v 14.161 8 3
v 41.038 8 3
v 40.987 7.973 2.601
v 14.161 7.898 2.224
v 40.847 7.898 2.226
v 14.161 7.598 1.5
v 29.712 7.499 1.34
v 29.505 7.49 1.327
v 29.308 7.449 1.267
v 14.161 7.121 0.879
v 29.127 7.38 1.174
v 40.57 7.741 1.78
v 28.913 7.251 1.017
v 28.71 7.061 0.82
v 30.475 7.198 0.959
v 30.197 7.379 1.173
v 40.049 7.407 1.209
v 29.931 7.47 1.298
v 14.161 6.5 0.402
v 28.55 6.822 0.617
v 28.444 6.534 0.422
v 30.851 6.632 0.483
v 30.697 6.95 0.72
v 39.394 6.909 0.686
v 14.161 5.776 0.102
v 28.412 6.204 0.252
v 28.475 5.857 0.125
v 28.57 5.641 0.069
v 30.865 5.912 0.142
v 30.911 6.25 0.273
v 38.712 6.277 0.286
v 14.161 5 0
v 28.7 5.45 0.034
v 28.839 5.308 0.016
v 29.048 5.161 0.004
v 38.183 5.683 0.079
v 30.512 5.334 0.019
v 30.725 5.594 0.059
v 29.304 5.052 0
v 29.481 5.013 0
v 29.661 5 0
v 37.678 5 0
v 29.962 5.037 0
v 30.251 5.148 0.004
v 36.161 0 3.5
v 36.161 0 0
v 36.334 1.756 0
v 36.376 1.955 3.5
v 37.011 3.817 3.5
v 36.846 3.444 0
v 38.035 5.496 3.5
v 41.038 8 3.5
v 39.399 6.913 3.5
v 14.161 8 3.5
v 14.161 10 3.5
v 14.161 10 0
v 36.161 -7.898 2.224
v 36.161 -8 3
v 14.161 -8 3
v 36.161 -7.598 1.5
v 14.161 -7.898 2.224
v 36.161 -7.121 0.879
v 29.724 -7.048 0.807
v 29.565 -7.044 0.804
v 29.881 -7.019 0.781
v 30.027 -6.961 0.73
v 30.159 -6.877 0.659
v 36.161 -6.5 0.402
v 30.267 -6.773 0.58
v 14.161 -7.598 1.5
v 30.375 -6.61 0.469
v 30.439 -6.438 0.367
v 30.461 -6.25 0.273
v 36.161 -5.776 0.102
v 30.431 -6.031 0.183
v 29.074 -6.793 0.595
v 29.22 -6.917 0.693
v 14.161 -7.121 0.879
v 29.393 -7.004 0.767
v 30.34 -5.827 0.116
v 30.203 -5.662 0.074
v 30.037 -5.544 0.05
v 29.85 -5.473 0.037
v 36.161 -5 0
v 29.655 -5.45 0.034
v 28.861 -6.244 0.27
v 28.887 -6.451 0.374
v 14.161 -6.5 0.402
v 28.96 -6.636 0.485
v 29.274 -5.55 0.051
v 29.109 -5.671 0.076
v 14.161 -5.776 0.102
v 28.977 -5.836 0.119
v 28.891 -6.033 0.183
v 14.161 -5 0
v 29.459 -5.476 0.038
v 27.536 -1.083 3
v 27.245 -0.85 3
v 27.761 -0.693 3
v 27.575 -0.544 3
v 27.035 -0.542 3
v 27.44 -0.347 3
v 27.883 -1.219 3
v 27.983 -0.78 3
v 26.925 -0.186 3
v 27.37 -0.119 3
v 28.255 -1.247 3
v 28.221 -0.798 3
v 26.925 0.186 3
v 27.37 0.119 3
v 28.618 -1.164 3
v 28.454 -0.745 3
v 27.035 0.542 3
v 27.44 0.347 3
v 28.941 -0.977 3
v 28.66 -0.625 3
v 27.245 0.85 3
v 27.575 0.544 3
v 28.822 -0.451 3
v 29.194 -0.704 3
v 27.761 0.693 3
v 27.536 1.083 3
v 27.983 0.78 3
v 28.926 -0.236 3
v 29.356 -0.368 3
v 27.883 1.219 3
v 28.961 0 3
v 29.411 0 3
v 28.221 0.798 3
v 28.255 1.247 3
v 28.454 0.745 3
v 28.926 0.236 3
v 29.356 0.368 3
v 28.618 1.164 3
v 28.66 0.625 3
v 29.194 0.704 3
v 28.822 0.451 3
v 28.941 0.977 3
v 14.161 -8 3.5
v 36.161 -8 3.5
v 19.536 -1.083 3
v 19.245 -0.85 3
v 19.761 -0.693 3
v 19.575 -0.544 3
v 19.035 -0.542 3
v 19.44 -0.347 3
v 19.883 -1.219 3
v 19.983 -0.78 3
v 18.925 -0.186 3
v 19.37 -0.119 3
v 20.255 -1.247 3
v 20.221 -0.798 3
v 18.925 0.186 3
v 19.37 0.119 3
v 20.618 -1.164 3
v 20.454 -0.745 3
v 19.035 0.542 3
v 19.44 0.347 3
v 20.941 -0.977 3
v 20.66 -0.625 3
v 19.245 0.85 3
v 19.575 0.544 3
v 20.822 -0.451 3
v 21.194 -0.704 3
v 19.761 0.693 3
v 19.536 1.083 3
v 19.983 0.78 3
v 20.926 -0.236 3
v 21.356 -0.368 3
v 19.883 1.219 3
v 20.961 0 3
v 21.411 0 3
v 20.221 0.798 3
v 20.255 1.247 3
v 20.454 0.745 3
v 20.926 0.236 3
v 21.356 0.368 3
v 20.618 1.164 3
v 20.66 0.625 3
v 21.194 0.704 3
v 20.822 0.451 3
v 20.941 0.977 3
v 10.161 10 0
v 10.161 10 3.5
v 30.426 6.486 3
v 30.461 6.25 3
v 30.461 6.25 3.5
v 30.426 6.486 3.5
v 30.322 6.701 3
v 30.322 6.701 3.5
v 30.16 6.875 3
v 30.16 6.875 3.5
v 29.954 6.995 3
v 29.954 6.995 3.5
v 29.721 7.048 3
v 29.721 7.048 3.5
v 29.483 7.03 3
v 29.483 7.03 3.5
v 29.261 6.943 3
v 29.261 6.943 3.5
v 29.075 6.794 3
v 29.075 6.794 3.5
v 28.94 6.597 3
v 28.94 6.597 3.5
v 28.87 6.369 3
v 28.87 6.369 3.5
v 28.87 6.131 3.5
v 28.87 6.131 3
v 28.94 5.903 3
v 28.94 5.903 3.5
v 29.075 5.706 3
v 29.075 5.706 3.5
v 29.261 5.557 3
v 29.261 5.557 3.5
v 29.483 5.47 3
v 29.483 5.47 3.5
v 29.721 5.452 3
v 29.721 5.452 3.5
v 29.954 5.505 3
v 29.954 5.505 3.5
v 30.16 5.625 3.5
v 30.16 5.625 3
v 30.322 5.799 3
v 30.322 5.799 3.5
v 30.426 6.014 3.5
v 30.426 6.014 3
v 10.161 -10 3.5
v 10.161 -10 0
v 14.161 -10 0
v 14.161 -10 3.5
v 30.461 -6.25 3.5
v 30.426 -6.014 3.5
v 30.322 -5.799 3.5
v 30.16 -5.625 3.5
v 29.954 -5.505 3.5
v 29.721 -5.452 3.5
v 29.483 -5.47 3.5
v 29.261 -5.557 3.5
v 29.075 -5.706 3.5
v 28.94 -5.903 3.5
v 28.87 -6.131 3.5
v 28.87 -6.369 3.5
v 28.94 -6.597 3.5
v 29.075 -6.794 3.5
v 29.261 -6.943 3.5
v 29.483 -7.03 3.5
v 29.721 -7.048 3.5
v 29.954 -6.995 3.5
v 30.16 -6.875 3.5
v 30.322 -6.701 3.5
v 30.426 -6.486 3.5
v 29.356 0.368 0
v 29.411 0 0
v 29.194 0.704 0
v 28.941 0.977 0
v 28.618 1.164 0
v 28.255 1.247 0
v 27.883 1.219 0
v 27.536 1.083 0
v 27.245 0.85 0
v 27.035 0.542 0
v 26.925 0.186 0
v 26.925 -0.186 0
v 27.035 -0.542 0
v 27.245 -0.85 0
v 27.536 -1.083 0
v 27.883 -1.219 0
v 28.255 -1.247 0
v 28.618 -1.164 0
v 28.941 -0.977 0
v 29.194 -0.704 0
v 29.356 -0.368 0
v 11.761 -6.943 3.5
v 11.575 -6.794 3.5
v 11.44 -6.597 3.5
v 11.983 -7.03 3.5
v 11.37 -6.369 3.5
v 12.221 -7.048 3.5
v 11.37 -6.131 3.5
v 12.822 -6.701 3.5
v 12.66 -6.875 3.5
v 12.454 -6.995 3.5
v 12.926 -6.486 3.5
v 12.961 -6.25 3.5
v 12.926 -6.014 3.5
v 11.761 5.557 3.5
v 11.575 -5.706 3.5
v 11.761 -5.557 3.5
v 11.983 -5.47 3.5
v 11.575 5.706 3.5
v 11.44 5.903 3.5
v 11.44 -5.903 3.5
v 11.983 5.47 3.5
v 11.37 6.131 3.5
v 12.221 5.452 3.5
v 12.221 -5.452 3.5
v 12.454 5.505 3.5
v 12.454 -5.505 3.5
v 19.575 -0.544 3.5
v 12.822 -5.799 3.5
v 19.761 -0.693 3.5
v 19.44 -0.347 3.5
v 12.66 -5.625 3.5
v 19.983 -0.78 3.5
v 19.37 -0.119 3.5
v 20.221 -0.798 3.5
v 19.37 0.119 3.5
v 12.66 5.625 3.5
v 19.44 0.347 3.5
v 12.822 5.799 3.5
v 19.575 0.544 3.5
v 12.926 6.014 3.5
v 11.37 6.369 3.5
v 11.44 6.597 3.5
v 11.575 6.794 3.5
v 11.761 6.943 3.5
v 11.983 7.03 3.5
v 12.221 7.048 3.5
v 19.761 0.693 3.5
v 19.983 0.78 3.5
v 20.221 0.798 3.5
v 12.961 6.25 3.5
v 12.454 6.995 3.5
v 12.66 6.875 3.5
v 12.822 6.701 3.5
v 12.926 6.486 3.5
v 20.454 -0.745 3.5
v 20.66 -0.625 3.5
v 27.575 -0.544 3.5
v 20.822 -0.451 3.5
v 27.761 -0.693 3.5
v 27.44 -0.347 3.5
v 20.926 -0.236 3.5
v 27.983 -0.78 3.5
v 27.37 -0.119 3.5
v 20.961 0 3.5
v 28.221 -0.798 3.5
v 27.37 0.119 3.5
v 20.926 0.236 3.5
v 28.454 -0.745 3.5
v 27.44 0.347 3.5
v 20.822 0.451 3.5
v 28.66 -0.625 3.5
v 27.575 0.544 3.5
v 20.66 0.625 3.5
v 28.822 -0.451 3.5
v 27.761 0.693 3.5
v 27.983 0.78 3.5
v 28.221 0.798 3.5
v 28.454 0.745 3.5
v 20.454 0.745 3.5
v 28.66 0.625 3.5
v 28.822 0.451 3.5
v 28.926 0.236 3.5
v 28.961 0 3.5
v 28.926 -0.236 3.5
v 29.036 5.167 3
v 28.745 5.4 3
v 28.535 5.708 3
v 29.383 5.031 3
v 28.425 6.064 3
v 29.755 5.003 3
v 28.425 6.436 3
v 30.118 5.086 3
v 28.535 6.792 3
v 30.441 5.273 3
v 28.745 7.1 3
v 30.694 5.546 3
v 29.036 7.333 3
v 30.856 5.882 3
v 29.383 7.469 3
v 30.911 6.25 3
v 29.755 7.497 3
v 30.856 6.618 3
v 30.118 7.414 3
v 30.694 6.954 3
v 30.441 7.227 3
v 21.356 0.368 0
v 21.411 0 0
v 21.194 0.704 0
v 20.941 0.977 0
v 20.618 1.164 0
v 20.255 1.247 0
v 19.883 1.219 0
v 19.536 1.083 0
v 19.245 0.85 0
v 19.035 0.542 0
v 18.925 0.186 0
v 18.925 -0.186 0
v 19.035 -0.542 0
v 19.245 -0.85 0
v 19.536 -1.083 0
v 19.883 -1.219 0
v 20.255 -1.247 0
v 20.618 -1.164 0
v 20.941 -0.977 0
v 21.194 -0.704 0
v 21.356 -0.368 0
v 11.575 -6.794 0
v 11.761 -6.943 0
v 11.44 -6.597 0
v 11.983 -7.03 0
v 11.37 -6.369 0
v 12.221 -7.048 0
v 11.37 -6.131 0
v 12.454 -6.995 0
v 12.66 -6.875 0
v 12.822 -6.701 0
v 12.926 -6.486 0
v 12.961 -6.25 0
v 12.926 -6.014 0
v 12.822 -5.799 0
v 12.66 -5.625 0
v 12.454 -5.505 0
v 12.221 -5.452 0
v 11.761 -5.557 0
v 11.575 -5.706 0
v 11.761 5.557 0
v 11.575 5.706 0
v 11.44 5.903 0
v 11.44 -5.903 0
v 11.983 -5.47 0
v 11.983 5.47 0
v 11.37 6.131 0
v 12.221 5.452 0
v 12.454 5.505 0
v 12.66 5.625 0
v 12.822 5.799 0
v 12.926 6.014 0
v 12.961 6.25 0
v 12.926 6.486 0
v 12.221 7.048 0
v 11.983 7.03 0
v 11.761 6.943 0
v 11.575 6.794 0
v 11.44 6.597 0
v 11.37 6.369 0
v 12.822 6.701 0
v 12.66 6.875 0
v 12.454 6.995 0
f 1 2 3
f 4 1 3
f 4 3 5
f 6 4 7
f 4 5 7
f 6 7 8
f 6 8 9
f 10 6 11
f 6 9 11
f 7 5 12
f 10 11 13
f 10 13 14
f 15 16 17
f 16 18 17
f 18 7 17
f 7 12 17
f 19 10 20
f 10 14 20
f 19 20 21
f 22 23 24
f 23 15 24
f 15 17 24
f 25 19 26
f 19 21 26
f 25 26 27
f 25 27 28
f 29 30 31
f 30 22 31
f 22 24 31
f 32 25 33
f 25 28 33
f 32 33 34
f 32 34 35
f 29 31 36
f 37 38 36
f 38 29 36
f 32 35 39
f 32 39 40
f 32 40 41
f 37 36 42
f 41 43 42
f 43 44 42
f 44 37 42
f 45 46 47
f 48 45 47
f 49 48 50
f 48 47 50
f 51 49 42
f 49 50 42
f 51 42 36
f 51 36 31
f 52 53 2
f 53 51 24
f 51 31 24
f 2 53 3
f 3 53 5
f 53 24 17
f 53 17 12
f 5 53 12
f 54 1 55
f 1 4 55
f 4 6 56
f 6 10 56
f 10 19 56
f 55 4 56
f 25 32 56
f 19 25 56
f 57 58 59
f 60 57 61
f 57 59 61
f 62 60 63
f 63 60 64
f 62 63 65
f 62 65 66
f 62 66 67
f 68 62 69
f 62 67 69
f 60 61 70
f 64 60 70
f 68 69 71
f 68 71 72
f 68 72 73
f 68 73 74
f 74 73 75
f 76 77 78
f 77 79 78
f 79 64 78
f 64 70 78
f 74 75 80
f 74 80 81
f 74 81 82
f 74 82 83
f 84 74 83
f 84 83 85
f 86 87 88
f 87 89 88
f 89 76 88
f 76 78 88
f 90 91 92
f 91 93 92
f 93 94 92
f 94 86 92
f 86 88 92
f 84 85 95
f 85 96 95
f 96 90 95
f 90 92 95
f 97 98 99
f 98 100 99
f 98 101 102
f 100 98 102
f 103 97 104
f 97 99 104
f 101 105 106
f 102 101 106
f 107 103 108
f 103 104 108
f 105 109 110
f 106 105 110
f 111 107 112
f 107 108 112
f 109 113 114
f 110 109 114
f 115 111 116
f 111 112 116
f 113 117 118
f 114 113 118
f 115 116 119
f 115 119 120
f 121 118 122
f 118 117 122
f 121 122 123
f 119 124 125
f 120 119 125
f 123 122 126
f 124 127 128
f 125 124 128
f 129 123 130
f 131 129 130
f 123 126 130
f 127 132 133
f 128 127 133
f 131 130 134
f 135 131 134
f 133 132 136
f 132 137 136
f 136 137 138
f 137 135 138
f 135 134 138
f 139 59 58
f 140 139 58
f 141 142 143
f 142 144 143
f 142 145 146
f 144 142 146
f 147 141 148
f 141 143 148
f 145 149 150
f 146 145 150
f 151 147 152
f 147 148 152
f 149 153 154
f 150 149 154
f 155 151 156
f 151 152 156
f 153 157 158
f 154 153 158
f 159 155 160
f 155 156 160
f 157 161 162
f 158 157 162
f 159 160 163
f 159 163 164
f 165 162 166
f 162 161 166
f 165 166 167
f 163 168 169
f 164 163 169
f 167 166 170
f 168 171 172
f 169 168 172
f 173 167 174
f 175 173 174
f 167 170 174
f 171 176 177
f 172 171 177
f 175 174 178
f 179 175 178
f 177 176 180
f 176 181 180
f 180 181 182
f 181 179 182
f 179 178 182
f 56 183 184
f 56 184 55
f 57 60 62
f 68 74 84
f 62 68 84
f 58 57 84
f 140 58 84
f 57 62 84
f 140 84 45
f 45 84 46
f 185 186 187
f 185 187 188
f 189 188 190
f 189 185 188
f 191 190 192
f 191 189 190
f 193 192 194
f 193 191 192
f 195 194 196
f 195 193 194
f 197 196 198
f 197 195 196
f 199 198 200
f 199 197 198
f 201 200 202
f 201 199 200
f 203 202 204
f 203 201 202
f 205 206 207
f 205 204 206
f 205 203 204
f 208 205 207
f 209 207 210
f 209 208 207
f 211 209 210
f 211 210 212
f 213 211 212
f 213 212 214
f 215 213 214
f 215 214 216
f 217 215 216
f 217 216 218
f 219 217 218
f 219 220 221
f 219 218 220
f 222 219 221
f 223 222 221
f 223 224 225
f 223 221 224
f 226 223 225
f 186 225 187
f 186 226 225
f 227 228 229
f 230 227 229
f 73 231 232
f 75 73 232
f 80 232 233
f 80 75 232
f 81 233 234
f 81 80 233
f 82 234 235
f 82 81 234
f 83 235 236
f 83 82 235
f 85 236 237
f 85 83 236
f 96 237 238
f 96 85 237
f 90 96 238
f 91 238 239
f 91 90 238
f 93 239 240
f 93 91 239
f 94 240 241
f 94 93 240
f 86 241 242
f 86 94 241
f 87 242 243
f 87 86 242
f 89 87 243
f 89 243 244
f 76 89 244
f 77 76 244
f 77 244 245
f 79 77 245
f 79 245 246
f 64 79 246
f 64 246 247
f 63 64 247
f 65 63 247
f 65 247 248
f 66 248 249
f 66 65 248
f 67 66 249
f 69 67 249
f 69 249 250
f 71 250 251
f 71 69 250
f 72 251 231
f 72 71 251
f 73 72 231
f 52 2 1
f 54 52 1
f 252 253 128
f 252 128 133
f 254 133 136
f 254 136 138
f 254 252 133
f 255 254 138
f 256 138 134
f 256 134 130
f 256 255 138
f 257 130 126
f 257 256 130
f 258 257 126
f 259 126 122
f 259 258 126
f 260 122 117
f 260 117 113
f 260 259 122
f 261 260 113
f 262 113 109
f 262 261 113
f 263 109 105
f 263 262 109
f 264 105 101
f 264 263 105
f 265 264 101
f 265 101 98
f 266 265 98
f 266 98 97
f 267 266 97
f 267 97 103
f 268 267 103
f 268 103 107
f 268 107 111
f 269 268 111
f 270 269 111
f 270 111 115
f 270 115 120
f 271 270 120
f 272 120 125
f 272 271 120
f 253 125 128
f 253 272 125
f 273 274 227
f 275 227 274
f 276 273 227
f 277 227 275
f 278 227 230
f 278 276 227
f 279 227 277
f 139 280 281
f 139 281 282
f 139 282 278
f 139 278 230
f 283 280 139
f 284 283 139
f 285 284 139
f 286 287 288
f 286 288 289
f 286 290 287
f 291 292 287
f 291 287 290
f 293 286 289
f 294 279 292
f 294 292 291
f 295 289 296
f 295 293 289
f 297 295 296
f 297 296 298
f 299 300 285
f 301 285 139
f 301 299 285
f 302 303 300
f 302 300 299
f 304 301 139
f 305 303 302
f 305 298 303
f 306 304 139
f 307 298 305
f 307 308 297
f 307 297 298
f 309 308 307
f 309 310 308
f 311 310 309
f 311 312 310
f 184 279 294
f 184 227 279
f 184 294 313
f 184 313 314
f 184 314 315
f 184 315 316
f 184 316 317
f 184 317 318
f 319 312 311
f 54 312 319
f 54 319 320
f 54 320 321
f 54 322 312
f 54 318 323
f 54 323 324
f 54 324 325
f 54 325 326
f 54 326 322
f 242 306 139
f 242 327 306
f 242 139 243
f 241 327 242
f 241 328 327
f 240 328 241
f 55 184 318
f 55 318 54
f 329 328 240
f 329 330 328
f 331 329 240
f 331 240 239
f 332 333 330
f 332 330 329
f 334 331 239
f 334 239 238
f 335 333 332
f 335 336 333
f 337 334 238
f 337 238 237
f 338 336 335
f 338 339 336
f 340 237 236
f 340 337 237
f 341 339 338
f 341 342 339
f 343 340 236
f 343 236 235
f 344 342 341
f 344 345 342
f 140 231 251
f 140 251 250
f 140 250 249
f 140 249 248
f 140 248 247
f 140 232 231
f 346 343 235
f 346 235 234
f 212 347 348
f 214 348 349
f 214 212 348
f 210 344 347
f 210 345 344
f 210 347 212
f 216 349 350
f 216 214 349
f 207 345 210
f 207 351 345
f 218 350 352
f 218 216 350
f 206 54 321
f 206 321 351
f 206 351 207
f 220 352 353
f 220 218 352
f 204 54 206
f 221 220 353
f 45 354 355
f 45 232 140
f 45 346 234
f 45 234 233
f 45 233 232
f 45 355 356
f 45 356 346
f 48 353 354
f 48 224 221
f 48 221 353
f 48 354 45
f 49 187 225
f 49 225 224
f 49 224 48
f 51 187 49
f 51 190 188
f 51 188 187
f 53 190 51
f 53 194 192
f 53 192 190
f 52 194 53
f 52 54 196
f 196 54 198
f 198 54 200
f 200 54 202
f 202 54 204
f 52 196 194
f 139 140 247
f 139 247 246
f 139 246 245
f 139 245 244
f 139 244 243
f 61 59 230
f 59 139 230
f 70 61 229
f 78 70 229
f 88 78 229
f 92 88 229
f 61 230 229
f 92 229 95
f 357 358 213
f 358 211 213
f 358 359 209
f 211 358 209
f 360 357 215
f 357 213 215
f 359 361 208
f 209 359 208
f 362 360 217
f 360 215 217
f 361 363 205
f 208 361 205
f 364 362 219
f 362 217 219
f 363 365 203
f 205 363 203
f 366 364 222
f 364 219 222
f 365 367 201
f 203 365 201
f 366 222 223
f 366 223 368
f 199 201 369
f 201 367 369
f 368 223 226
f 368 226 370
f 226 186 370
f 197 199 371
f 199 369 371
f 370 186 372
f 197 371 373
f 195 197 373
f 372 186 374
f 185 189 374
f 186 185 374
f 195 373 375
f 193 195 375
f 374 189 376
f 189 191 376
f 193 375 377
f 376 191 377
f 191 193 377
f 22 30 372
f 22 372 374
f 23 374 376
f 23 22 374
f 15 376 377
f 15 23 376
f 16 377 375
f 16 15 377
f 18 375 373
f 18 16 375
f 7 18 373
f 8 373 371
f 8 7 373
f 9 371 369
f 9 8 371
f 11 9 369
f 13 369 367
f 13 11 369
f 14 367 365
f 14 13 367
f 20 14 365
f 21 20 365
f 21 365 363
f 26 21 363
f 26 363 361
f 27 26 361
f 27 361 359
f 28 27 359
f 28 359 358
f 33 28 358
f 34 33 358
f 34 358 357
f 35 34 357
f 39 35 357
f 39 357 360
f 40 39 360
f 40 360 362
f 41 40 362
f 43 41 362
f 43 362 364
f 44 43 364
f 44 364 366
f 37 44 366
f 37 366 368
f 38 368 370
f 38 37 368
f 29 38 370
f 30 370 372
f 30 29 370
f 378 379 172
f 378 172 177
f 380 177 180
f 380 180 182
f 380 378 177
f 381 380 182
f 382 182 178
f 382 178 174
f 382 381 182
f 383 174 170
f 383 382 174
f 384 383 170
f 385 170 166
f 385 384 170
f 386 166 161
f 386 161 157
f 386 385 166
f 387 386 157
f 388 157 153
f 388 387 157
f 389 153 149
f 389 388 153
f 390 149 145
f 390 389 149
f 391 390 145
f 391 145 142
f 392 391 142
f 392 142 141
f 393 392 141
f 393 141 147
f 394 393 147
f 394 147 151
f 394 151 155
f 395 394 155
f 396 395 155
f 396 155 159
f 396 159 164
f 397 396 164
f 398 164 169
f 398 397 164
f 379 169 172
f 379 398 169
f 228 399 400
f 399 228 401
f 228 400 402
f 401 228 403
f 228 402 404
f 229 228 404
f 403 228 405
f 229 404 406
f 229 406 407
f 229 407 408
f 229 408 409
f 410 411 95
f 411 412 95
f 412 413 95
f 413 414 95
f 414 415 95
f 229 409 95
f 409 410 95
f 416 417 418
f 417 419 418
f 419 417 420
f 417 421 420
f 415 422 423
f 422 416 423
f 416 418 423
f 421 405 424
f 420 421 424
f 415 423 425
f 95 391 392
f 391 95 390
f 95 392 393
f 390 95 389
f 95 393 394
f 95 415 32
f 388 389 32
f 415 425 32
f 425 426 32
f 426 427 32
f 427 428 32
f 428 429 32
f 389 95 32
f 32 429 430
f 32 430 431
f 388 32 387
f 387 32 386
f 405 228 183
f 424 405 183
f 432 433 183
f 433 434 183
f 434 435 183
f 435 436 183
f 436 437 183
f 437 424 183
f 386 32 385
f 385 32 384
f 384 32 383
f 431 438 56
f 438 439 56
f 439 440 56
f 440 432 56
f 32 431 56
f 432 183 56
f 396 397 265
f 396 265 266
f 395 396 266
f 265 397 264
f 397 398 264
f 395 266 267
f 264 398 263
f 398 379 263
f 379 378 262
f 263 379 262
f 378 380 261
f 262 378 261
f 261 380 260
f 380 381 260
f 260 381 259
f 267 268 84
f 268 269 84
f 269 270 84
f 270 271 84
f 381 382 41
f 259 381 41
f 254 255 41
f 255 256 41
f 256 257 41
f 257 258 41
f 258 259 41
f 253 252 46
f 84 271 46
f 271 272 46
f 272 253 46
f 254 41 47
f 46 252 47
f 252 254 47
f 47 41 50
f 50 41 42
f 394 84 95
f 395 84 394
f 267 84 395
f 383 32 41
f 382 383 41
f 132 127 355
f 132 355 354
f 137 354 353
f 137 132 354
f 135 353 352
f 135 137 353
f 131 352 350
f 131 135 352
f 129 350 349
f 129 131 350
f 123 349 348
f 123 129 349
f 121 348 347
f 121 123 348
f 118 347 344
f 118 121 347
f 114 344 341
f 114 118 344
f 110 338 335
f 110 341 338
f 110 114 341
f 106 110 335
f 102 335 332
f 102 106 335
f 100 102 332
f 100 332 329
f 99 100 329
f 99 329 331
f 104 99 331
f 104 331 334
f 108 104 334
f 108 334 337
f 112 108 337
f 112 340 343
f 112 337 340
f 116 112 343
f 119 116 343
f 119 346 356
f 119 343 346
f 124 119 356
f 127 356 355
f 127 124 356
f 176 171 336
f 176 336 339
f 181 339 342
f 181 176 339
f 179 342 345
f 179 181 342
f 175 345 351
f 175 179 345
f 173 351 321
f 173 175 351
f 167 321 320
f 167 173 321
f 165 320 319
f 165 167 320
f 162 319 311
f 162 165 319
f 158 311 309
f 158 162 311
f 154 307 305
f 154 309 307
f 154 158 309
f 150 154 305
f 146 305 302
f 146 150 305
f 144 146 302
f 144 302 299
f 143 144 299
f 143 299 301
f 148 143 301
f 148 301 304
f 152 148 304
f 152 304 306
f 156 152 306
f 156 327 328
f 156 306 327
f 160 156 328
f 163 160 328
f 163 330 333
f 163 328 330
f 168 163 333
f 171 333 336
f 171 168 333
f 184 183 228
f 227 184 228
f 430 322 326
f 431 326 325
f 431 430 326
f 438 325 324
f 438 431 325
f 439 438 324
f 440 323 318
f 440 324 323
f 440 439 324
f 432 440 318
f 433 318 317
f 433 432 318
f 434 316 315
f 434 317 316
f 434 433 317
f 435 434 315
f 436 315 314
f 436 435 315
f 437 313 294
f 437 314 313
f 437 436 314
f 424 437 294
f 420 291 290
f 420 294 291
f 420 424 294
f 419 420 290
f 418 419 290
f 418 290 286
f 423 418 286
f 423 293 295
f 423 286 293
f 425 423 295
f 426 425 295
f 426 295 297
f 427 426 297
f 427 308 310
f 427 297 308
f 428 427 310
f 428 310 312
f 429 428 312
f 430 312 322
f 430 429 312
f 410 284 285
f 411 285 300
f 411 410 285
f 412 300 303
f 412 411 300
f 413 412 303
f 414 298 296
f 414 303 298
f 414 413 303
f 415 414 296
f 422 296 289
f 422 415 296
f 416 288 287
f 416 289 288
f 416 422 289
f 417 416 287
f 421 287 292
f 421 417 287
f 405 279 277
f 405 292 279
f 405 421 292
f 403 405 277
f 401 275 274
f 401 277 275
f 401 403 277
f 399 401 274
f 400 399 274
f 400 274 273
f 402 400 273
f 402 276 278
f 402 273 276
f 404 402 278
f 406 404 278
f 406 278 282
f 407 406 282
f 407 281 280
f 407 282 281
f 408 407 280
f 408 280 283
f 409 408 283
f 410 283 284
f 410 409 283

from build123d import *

# Parameters (mm, degrees)
SKETCH1_W           = 4
SKETCH1_H           = 2
BOSS_EXTRUDE1_DEPTH = 3.5
SKETCH2_R           = 0.8
SCREW_HOLES_DEPTH   = 43.383720665
SKETCH3_R           = 1.25
SCREW_HEADS_DEPTH   = 3
FILLET1_R           = 3


with BuildPart() as part:
    # Sketch1 → Boss-Extrude1 (new body)
    with BuildSketch(Plane.XY):
        with BuildLine():
            Line((10.161255894, 0), (36.161255894, 0))
            ThreePointArc((36.161255894, 0), (37.476597455, 4.684658438), (41.038150268, 8))
            Line((41.038150268, 8), (14.161255894, 8))
            Line((14.161255894, 8), (10.161255894, 8))
            Line((10.161255894, 8), (10.161255894, 0))
        make_face()
        Polygon((36.161255894, -8), (36.161255894, 0), (10.161255894, 0), (10.161255894, -8), (14.161255894, -8), align=None)
        with Locations((12.161255894, 9)):
            Rectangle(SKETCH1_W, SKETCH1_H)
        with Locations((12.161255894, -9)):
            Rectangle(SKETCH1_W, SKETCH1_H)
    extrude(amount=BOSS_EXTRUDE1_DEPTH)

    # Sketch2 → Screw Holes (cut, through all)
    with BuildSketch(Plane.XY):
        with Locations((20.161255894, 0)):
            Circle(SKETCH2_R)
        with Locations((12.161255894, -6.25)):
            Circle(SKETCH2_R)
        with Locations((29.661255894, 6.25)):
            Circle(SKETCH2_R)
        with Locations((29.661255894, -6.25)):
            Circle(SKETCH2_R)
        with Locations((12.161255894, 6.25)):
            Circle(SKETCH2_R)
        with Locations((28.161255894, 0)):
            Circle(SKETCH2_R)
    extrude(amount=SCREW_HOLES_DEPTH, mode=Mode.SUBTRACT)

    # Sketch3 → Screw Heads (cut)
    with BuildSketch(Plane.XY):
        with Locations((20.161255894, 0)):
            Circle(SKETCH3_R)
        with Locations((29.661255894, 6.25)):
            Circle(SKETCH3_R)
        with Locations((28.161255894, 0)):
            Circle(SKETCH3_R)
    extrude(amount=SCREW_HEADS_DEPTH, mode=Mode.SUBTRACT)

    # Fillet1
    # the kernel refuses this fillet: 3 mm, written as the material it takes off along each edge
    with BuildSketch(Plane(origin=(48.538150268, 8, 0), x_dir=(0, 0, 1), z_dir=(-1, 0, 0))) as fillet1_piece_1:
        with BuildLine():
            CenterArc((FILLET1_R, -FILLET1_R), FILLET1_R, 90, 90)
            Line((0, -FILLET1_R), (0, 0))
            Line((0, 0), (FILLET1_R, 0))
        make_face()
    extrude(amount=34.376894374, mode=Mode.SUBTRACT)
    with BuildSketch(Plane(origin=(14.161255894, -8, 0), x_dir=(0, 0, 1), z_dir=(1, 0, 0))) as fillet1_piece_2:
        with BuildLine():
            CenterArc((FILLET1_R, -FILLET1_R), FILLET1_R, 90, 90)
            Line((0, -FILLET1_R), (0, 0))
            Line((0, 0), (FILLET1_R, 0))
        make_face()
    extrude(amount=29.5, mode=Mode.SUBTRACT)


solid = part.part
